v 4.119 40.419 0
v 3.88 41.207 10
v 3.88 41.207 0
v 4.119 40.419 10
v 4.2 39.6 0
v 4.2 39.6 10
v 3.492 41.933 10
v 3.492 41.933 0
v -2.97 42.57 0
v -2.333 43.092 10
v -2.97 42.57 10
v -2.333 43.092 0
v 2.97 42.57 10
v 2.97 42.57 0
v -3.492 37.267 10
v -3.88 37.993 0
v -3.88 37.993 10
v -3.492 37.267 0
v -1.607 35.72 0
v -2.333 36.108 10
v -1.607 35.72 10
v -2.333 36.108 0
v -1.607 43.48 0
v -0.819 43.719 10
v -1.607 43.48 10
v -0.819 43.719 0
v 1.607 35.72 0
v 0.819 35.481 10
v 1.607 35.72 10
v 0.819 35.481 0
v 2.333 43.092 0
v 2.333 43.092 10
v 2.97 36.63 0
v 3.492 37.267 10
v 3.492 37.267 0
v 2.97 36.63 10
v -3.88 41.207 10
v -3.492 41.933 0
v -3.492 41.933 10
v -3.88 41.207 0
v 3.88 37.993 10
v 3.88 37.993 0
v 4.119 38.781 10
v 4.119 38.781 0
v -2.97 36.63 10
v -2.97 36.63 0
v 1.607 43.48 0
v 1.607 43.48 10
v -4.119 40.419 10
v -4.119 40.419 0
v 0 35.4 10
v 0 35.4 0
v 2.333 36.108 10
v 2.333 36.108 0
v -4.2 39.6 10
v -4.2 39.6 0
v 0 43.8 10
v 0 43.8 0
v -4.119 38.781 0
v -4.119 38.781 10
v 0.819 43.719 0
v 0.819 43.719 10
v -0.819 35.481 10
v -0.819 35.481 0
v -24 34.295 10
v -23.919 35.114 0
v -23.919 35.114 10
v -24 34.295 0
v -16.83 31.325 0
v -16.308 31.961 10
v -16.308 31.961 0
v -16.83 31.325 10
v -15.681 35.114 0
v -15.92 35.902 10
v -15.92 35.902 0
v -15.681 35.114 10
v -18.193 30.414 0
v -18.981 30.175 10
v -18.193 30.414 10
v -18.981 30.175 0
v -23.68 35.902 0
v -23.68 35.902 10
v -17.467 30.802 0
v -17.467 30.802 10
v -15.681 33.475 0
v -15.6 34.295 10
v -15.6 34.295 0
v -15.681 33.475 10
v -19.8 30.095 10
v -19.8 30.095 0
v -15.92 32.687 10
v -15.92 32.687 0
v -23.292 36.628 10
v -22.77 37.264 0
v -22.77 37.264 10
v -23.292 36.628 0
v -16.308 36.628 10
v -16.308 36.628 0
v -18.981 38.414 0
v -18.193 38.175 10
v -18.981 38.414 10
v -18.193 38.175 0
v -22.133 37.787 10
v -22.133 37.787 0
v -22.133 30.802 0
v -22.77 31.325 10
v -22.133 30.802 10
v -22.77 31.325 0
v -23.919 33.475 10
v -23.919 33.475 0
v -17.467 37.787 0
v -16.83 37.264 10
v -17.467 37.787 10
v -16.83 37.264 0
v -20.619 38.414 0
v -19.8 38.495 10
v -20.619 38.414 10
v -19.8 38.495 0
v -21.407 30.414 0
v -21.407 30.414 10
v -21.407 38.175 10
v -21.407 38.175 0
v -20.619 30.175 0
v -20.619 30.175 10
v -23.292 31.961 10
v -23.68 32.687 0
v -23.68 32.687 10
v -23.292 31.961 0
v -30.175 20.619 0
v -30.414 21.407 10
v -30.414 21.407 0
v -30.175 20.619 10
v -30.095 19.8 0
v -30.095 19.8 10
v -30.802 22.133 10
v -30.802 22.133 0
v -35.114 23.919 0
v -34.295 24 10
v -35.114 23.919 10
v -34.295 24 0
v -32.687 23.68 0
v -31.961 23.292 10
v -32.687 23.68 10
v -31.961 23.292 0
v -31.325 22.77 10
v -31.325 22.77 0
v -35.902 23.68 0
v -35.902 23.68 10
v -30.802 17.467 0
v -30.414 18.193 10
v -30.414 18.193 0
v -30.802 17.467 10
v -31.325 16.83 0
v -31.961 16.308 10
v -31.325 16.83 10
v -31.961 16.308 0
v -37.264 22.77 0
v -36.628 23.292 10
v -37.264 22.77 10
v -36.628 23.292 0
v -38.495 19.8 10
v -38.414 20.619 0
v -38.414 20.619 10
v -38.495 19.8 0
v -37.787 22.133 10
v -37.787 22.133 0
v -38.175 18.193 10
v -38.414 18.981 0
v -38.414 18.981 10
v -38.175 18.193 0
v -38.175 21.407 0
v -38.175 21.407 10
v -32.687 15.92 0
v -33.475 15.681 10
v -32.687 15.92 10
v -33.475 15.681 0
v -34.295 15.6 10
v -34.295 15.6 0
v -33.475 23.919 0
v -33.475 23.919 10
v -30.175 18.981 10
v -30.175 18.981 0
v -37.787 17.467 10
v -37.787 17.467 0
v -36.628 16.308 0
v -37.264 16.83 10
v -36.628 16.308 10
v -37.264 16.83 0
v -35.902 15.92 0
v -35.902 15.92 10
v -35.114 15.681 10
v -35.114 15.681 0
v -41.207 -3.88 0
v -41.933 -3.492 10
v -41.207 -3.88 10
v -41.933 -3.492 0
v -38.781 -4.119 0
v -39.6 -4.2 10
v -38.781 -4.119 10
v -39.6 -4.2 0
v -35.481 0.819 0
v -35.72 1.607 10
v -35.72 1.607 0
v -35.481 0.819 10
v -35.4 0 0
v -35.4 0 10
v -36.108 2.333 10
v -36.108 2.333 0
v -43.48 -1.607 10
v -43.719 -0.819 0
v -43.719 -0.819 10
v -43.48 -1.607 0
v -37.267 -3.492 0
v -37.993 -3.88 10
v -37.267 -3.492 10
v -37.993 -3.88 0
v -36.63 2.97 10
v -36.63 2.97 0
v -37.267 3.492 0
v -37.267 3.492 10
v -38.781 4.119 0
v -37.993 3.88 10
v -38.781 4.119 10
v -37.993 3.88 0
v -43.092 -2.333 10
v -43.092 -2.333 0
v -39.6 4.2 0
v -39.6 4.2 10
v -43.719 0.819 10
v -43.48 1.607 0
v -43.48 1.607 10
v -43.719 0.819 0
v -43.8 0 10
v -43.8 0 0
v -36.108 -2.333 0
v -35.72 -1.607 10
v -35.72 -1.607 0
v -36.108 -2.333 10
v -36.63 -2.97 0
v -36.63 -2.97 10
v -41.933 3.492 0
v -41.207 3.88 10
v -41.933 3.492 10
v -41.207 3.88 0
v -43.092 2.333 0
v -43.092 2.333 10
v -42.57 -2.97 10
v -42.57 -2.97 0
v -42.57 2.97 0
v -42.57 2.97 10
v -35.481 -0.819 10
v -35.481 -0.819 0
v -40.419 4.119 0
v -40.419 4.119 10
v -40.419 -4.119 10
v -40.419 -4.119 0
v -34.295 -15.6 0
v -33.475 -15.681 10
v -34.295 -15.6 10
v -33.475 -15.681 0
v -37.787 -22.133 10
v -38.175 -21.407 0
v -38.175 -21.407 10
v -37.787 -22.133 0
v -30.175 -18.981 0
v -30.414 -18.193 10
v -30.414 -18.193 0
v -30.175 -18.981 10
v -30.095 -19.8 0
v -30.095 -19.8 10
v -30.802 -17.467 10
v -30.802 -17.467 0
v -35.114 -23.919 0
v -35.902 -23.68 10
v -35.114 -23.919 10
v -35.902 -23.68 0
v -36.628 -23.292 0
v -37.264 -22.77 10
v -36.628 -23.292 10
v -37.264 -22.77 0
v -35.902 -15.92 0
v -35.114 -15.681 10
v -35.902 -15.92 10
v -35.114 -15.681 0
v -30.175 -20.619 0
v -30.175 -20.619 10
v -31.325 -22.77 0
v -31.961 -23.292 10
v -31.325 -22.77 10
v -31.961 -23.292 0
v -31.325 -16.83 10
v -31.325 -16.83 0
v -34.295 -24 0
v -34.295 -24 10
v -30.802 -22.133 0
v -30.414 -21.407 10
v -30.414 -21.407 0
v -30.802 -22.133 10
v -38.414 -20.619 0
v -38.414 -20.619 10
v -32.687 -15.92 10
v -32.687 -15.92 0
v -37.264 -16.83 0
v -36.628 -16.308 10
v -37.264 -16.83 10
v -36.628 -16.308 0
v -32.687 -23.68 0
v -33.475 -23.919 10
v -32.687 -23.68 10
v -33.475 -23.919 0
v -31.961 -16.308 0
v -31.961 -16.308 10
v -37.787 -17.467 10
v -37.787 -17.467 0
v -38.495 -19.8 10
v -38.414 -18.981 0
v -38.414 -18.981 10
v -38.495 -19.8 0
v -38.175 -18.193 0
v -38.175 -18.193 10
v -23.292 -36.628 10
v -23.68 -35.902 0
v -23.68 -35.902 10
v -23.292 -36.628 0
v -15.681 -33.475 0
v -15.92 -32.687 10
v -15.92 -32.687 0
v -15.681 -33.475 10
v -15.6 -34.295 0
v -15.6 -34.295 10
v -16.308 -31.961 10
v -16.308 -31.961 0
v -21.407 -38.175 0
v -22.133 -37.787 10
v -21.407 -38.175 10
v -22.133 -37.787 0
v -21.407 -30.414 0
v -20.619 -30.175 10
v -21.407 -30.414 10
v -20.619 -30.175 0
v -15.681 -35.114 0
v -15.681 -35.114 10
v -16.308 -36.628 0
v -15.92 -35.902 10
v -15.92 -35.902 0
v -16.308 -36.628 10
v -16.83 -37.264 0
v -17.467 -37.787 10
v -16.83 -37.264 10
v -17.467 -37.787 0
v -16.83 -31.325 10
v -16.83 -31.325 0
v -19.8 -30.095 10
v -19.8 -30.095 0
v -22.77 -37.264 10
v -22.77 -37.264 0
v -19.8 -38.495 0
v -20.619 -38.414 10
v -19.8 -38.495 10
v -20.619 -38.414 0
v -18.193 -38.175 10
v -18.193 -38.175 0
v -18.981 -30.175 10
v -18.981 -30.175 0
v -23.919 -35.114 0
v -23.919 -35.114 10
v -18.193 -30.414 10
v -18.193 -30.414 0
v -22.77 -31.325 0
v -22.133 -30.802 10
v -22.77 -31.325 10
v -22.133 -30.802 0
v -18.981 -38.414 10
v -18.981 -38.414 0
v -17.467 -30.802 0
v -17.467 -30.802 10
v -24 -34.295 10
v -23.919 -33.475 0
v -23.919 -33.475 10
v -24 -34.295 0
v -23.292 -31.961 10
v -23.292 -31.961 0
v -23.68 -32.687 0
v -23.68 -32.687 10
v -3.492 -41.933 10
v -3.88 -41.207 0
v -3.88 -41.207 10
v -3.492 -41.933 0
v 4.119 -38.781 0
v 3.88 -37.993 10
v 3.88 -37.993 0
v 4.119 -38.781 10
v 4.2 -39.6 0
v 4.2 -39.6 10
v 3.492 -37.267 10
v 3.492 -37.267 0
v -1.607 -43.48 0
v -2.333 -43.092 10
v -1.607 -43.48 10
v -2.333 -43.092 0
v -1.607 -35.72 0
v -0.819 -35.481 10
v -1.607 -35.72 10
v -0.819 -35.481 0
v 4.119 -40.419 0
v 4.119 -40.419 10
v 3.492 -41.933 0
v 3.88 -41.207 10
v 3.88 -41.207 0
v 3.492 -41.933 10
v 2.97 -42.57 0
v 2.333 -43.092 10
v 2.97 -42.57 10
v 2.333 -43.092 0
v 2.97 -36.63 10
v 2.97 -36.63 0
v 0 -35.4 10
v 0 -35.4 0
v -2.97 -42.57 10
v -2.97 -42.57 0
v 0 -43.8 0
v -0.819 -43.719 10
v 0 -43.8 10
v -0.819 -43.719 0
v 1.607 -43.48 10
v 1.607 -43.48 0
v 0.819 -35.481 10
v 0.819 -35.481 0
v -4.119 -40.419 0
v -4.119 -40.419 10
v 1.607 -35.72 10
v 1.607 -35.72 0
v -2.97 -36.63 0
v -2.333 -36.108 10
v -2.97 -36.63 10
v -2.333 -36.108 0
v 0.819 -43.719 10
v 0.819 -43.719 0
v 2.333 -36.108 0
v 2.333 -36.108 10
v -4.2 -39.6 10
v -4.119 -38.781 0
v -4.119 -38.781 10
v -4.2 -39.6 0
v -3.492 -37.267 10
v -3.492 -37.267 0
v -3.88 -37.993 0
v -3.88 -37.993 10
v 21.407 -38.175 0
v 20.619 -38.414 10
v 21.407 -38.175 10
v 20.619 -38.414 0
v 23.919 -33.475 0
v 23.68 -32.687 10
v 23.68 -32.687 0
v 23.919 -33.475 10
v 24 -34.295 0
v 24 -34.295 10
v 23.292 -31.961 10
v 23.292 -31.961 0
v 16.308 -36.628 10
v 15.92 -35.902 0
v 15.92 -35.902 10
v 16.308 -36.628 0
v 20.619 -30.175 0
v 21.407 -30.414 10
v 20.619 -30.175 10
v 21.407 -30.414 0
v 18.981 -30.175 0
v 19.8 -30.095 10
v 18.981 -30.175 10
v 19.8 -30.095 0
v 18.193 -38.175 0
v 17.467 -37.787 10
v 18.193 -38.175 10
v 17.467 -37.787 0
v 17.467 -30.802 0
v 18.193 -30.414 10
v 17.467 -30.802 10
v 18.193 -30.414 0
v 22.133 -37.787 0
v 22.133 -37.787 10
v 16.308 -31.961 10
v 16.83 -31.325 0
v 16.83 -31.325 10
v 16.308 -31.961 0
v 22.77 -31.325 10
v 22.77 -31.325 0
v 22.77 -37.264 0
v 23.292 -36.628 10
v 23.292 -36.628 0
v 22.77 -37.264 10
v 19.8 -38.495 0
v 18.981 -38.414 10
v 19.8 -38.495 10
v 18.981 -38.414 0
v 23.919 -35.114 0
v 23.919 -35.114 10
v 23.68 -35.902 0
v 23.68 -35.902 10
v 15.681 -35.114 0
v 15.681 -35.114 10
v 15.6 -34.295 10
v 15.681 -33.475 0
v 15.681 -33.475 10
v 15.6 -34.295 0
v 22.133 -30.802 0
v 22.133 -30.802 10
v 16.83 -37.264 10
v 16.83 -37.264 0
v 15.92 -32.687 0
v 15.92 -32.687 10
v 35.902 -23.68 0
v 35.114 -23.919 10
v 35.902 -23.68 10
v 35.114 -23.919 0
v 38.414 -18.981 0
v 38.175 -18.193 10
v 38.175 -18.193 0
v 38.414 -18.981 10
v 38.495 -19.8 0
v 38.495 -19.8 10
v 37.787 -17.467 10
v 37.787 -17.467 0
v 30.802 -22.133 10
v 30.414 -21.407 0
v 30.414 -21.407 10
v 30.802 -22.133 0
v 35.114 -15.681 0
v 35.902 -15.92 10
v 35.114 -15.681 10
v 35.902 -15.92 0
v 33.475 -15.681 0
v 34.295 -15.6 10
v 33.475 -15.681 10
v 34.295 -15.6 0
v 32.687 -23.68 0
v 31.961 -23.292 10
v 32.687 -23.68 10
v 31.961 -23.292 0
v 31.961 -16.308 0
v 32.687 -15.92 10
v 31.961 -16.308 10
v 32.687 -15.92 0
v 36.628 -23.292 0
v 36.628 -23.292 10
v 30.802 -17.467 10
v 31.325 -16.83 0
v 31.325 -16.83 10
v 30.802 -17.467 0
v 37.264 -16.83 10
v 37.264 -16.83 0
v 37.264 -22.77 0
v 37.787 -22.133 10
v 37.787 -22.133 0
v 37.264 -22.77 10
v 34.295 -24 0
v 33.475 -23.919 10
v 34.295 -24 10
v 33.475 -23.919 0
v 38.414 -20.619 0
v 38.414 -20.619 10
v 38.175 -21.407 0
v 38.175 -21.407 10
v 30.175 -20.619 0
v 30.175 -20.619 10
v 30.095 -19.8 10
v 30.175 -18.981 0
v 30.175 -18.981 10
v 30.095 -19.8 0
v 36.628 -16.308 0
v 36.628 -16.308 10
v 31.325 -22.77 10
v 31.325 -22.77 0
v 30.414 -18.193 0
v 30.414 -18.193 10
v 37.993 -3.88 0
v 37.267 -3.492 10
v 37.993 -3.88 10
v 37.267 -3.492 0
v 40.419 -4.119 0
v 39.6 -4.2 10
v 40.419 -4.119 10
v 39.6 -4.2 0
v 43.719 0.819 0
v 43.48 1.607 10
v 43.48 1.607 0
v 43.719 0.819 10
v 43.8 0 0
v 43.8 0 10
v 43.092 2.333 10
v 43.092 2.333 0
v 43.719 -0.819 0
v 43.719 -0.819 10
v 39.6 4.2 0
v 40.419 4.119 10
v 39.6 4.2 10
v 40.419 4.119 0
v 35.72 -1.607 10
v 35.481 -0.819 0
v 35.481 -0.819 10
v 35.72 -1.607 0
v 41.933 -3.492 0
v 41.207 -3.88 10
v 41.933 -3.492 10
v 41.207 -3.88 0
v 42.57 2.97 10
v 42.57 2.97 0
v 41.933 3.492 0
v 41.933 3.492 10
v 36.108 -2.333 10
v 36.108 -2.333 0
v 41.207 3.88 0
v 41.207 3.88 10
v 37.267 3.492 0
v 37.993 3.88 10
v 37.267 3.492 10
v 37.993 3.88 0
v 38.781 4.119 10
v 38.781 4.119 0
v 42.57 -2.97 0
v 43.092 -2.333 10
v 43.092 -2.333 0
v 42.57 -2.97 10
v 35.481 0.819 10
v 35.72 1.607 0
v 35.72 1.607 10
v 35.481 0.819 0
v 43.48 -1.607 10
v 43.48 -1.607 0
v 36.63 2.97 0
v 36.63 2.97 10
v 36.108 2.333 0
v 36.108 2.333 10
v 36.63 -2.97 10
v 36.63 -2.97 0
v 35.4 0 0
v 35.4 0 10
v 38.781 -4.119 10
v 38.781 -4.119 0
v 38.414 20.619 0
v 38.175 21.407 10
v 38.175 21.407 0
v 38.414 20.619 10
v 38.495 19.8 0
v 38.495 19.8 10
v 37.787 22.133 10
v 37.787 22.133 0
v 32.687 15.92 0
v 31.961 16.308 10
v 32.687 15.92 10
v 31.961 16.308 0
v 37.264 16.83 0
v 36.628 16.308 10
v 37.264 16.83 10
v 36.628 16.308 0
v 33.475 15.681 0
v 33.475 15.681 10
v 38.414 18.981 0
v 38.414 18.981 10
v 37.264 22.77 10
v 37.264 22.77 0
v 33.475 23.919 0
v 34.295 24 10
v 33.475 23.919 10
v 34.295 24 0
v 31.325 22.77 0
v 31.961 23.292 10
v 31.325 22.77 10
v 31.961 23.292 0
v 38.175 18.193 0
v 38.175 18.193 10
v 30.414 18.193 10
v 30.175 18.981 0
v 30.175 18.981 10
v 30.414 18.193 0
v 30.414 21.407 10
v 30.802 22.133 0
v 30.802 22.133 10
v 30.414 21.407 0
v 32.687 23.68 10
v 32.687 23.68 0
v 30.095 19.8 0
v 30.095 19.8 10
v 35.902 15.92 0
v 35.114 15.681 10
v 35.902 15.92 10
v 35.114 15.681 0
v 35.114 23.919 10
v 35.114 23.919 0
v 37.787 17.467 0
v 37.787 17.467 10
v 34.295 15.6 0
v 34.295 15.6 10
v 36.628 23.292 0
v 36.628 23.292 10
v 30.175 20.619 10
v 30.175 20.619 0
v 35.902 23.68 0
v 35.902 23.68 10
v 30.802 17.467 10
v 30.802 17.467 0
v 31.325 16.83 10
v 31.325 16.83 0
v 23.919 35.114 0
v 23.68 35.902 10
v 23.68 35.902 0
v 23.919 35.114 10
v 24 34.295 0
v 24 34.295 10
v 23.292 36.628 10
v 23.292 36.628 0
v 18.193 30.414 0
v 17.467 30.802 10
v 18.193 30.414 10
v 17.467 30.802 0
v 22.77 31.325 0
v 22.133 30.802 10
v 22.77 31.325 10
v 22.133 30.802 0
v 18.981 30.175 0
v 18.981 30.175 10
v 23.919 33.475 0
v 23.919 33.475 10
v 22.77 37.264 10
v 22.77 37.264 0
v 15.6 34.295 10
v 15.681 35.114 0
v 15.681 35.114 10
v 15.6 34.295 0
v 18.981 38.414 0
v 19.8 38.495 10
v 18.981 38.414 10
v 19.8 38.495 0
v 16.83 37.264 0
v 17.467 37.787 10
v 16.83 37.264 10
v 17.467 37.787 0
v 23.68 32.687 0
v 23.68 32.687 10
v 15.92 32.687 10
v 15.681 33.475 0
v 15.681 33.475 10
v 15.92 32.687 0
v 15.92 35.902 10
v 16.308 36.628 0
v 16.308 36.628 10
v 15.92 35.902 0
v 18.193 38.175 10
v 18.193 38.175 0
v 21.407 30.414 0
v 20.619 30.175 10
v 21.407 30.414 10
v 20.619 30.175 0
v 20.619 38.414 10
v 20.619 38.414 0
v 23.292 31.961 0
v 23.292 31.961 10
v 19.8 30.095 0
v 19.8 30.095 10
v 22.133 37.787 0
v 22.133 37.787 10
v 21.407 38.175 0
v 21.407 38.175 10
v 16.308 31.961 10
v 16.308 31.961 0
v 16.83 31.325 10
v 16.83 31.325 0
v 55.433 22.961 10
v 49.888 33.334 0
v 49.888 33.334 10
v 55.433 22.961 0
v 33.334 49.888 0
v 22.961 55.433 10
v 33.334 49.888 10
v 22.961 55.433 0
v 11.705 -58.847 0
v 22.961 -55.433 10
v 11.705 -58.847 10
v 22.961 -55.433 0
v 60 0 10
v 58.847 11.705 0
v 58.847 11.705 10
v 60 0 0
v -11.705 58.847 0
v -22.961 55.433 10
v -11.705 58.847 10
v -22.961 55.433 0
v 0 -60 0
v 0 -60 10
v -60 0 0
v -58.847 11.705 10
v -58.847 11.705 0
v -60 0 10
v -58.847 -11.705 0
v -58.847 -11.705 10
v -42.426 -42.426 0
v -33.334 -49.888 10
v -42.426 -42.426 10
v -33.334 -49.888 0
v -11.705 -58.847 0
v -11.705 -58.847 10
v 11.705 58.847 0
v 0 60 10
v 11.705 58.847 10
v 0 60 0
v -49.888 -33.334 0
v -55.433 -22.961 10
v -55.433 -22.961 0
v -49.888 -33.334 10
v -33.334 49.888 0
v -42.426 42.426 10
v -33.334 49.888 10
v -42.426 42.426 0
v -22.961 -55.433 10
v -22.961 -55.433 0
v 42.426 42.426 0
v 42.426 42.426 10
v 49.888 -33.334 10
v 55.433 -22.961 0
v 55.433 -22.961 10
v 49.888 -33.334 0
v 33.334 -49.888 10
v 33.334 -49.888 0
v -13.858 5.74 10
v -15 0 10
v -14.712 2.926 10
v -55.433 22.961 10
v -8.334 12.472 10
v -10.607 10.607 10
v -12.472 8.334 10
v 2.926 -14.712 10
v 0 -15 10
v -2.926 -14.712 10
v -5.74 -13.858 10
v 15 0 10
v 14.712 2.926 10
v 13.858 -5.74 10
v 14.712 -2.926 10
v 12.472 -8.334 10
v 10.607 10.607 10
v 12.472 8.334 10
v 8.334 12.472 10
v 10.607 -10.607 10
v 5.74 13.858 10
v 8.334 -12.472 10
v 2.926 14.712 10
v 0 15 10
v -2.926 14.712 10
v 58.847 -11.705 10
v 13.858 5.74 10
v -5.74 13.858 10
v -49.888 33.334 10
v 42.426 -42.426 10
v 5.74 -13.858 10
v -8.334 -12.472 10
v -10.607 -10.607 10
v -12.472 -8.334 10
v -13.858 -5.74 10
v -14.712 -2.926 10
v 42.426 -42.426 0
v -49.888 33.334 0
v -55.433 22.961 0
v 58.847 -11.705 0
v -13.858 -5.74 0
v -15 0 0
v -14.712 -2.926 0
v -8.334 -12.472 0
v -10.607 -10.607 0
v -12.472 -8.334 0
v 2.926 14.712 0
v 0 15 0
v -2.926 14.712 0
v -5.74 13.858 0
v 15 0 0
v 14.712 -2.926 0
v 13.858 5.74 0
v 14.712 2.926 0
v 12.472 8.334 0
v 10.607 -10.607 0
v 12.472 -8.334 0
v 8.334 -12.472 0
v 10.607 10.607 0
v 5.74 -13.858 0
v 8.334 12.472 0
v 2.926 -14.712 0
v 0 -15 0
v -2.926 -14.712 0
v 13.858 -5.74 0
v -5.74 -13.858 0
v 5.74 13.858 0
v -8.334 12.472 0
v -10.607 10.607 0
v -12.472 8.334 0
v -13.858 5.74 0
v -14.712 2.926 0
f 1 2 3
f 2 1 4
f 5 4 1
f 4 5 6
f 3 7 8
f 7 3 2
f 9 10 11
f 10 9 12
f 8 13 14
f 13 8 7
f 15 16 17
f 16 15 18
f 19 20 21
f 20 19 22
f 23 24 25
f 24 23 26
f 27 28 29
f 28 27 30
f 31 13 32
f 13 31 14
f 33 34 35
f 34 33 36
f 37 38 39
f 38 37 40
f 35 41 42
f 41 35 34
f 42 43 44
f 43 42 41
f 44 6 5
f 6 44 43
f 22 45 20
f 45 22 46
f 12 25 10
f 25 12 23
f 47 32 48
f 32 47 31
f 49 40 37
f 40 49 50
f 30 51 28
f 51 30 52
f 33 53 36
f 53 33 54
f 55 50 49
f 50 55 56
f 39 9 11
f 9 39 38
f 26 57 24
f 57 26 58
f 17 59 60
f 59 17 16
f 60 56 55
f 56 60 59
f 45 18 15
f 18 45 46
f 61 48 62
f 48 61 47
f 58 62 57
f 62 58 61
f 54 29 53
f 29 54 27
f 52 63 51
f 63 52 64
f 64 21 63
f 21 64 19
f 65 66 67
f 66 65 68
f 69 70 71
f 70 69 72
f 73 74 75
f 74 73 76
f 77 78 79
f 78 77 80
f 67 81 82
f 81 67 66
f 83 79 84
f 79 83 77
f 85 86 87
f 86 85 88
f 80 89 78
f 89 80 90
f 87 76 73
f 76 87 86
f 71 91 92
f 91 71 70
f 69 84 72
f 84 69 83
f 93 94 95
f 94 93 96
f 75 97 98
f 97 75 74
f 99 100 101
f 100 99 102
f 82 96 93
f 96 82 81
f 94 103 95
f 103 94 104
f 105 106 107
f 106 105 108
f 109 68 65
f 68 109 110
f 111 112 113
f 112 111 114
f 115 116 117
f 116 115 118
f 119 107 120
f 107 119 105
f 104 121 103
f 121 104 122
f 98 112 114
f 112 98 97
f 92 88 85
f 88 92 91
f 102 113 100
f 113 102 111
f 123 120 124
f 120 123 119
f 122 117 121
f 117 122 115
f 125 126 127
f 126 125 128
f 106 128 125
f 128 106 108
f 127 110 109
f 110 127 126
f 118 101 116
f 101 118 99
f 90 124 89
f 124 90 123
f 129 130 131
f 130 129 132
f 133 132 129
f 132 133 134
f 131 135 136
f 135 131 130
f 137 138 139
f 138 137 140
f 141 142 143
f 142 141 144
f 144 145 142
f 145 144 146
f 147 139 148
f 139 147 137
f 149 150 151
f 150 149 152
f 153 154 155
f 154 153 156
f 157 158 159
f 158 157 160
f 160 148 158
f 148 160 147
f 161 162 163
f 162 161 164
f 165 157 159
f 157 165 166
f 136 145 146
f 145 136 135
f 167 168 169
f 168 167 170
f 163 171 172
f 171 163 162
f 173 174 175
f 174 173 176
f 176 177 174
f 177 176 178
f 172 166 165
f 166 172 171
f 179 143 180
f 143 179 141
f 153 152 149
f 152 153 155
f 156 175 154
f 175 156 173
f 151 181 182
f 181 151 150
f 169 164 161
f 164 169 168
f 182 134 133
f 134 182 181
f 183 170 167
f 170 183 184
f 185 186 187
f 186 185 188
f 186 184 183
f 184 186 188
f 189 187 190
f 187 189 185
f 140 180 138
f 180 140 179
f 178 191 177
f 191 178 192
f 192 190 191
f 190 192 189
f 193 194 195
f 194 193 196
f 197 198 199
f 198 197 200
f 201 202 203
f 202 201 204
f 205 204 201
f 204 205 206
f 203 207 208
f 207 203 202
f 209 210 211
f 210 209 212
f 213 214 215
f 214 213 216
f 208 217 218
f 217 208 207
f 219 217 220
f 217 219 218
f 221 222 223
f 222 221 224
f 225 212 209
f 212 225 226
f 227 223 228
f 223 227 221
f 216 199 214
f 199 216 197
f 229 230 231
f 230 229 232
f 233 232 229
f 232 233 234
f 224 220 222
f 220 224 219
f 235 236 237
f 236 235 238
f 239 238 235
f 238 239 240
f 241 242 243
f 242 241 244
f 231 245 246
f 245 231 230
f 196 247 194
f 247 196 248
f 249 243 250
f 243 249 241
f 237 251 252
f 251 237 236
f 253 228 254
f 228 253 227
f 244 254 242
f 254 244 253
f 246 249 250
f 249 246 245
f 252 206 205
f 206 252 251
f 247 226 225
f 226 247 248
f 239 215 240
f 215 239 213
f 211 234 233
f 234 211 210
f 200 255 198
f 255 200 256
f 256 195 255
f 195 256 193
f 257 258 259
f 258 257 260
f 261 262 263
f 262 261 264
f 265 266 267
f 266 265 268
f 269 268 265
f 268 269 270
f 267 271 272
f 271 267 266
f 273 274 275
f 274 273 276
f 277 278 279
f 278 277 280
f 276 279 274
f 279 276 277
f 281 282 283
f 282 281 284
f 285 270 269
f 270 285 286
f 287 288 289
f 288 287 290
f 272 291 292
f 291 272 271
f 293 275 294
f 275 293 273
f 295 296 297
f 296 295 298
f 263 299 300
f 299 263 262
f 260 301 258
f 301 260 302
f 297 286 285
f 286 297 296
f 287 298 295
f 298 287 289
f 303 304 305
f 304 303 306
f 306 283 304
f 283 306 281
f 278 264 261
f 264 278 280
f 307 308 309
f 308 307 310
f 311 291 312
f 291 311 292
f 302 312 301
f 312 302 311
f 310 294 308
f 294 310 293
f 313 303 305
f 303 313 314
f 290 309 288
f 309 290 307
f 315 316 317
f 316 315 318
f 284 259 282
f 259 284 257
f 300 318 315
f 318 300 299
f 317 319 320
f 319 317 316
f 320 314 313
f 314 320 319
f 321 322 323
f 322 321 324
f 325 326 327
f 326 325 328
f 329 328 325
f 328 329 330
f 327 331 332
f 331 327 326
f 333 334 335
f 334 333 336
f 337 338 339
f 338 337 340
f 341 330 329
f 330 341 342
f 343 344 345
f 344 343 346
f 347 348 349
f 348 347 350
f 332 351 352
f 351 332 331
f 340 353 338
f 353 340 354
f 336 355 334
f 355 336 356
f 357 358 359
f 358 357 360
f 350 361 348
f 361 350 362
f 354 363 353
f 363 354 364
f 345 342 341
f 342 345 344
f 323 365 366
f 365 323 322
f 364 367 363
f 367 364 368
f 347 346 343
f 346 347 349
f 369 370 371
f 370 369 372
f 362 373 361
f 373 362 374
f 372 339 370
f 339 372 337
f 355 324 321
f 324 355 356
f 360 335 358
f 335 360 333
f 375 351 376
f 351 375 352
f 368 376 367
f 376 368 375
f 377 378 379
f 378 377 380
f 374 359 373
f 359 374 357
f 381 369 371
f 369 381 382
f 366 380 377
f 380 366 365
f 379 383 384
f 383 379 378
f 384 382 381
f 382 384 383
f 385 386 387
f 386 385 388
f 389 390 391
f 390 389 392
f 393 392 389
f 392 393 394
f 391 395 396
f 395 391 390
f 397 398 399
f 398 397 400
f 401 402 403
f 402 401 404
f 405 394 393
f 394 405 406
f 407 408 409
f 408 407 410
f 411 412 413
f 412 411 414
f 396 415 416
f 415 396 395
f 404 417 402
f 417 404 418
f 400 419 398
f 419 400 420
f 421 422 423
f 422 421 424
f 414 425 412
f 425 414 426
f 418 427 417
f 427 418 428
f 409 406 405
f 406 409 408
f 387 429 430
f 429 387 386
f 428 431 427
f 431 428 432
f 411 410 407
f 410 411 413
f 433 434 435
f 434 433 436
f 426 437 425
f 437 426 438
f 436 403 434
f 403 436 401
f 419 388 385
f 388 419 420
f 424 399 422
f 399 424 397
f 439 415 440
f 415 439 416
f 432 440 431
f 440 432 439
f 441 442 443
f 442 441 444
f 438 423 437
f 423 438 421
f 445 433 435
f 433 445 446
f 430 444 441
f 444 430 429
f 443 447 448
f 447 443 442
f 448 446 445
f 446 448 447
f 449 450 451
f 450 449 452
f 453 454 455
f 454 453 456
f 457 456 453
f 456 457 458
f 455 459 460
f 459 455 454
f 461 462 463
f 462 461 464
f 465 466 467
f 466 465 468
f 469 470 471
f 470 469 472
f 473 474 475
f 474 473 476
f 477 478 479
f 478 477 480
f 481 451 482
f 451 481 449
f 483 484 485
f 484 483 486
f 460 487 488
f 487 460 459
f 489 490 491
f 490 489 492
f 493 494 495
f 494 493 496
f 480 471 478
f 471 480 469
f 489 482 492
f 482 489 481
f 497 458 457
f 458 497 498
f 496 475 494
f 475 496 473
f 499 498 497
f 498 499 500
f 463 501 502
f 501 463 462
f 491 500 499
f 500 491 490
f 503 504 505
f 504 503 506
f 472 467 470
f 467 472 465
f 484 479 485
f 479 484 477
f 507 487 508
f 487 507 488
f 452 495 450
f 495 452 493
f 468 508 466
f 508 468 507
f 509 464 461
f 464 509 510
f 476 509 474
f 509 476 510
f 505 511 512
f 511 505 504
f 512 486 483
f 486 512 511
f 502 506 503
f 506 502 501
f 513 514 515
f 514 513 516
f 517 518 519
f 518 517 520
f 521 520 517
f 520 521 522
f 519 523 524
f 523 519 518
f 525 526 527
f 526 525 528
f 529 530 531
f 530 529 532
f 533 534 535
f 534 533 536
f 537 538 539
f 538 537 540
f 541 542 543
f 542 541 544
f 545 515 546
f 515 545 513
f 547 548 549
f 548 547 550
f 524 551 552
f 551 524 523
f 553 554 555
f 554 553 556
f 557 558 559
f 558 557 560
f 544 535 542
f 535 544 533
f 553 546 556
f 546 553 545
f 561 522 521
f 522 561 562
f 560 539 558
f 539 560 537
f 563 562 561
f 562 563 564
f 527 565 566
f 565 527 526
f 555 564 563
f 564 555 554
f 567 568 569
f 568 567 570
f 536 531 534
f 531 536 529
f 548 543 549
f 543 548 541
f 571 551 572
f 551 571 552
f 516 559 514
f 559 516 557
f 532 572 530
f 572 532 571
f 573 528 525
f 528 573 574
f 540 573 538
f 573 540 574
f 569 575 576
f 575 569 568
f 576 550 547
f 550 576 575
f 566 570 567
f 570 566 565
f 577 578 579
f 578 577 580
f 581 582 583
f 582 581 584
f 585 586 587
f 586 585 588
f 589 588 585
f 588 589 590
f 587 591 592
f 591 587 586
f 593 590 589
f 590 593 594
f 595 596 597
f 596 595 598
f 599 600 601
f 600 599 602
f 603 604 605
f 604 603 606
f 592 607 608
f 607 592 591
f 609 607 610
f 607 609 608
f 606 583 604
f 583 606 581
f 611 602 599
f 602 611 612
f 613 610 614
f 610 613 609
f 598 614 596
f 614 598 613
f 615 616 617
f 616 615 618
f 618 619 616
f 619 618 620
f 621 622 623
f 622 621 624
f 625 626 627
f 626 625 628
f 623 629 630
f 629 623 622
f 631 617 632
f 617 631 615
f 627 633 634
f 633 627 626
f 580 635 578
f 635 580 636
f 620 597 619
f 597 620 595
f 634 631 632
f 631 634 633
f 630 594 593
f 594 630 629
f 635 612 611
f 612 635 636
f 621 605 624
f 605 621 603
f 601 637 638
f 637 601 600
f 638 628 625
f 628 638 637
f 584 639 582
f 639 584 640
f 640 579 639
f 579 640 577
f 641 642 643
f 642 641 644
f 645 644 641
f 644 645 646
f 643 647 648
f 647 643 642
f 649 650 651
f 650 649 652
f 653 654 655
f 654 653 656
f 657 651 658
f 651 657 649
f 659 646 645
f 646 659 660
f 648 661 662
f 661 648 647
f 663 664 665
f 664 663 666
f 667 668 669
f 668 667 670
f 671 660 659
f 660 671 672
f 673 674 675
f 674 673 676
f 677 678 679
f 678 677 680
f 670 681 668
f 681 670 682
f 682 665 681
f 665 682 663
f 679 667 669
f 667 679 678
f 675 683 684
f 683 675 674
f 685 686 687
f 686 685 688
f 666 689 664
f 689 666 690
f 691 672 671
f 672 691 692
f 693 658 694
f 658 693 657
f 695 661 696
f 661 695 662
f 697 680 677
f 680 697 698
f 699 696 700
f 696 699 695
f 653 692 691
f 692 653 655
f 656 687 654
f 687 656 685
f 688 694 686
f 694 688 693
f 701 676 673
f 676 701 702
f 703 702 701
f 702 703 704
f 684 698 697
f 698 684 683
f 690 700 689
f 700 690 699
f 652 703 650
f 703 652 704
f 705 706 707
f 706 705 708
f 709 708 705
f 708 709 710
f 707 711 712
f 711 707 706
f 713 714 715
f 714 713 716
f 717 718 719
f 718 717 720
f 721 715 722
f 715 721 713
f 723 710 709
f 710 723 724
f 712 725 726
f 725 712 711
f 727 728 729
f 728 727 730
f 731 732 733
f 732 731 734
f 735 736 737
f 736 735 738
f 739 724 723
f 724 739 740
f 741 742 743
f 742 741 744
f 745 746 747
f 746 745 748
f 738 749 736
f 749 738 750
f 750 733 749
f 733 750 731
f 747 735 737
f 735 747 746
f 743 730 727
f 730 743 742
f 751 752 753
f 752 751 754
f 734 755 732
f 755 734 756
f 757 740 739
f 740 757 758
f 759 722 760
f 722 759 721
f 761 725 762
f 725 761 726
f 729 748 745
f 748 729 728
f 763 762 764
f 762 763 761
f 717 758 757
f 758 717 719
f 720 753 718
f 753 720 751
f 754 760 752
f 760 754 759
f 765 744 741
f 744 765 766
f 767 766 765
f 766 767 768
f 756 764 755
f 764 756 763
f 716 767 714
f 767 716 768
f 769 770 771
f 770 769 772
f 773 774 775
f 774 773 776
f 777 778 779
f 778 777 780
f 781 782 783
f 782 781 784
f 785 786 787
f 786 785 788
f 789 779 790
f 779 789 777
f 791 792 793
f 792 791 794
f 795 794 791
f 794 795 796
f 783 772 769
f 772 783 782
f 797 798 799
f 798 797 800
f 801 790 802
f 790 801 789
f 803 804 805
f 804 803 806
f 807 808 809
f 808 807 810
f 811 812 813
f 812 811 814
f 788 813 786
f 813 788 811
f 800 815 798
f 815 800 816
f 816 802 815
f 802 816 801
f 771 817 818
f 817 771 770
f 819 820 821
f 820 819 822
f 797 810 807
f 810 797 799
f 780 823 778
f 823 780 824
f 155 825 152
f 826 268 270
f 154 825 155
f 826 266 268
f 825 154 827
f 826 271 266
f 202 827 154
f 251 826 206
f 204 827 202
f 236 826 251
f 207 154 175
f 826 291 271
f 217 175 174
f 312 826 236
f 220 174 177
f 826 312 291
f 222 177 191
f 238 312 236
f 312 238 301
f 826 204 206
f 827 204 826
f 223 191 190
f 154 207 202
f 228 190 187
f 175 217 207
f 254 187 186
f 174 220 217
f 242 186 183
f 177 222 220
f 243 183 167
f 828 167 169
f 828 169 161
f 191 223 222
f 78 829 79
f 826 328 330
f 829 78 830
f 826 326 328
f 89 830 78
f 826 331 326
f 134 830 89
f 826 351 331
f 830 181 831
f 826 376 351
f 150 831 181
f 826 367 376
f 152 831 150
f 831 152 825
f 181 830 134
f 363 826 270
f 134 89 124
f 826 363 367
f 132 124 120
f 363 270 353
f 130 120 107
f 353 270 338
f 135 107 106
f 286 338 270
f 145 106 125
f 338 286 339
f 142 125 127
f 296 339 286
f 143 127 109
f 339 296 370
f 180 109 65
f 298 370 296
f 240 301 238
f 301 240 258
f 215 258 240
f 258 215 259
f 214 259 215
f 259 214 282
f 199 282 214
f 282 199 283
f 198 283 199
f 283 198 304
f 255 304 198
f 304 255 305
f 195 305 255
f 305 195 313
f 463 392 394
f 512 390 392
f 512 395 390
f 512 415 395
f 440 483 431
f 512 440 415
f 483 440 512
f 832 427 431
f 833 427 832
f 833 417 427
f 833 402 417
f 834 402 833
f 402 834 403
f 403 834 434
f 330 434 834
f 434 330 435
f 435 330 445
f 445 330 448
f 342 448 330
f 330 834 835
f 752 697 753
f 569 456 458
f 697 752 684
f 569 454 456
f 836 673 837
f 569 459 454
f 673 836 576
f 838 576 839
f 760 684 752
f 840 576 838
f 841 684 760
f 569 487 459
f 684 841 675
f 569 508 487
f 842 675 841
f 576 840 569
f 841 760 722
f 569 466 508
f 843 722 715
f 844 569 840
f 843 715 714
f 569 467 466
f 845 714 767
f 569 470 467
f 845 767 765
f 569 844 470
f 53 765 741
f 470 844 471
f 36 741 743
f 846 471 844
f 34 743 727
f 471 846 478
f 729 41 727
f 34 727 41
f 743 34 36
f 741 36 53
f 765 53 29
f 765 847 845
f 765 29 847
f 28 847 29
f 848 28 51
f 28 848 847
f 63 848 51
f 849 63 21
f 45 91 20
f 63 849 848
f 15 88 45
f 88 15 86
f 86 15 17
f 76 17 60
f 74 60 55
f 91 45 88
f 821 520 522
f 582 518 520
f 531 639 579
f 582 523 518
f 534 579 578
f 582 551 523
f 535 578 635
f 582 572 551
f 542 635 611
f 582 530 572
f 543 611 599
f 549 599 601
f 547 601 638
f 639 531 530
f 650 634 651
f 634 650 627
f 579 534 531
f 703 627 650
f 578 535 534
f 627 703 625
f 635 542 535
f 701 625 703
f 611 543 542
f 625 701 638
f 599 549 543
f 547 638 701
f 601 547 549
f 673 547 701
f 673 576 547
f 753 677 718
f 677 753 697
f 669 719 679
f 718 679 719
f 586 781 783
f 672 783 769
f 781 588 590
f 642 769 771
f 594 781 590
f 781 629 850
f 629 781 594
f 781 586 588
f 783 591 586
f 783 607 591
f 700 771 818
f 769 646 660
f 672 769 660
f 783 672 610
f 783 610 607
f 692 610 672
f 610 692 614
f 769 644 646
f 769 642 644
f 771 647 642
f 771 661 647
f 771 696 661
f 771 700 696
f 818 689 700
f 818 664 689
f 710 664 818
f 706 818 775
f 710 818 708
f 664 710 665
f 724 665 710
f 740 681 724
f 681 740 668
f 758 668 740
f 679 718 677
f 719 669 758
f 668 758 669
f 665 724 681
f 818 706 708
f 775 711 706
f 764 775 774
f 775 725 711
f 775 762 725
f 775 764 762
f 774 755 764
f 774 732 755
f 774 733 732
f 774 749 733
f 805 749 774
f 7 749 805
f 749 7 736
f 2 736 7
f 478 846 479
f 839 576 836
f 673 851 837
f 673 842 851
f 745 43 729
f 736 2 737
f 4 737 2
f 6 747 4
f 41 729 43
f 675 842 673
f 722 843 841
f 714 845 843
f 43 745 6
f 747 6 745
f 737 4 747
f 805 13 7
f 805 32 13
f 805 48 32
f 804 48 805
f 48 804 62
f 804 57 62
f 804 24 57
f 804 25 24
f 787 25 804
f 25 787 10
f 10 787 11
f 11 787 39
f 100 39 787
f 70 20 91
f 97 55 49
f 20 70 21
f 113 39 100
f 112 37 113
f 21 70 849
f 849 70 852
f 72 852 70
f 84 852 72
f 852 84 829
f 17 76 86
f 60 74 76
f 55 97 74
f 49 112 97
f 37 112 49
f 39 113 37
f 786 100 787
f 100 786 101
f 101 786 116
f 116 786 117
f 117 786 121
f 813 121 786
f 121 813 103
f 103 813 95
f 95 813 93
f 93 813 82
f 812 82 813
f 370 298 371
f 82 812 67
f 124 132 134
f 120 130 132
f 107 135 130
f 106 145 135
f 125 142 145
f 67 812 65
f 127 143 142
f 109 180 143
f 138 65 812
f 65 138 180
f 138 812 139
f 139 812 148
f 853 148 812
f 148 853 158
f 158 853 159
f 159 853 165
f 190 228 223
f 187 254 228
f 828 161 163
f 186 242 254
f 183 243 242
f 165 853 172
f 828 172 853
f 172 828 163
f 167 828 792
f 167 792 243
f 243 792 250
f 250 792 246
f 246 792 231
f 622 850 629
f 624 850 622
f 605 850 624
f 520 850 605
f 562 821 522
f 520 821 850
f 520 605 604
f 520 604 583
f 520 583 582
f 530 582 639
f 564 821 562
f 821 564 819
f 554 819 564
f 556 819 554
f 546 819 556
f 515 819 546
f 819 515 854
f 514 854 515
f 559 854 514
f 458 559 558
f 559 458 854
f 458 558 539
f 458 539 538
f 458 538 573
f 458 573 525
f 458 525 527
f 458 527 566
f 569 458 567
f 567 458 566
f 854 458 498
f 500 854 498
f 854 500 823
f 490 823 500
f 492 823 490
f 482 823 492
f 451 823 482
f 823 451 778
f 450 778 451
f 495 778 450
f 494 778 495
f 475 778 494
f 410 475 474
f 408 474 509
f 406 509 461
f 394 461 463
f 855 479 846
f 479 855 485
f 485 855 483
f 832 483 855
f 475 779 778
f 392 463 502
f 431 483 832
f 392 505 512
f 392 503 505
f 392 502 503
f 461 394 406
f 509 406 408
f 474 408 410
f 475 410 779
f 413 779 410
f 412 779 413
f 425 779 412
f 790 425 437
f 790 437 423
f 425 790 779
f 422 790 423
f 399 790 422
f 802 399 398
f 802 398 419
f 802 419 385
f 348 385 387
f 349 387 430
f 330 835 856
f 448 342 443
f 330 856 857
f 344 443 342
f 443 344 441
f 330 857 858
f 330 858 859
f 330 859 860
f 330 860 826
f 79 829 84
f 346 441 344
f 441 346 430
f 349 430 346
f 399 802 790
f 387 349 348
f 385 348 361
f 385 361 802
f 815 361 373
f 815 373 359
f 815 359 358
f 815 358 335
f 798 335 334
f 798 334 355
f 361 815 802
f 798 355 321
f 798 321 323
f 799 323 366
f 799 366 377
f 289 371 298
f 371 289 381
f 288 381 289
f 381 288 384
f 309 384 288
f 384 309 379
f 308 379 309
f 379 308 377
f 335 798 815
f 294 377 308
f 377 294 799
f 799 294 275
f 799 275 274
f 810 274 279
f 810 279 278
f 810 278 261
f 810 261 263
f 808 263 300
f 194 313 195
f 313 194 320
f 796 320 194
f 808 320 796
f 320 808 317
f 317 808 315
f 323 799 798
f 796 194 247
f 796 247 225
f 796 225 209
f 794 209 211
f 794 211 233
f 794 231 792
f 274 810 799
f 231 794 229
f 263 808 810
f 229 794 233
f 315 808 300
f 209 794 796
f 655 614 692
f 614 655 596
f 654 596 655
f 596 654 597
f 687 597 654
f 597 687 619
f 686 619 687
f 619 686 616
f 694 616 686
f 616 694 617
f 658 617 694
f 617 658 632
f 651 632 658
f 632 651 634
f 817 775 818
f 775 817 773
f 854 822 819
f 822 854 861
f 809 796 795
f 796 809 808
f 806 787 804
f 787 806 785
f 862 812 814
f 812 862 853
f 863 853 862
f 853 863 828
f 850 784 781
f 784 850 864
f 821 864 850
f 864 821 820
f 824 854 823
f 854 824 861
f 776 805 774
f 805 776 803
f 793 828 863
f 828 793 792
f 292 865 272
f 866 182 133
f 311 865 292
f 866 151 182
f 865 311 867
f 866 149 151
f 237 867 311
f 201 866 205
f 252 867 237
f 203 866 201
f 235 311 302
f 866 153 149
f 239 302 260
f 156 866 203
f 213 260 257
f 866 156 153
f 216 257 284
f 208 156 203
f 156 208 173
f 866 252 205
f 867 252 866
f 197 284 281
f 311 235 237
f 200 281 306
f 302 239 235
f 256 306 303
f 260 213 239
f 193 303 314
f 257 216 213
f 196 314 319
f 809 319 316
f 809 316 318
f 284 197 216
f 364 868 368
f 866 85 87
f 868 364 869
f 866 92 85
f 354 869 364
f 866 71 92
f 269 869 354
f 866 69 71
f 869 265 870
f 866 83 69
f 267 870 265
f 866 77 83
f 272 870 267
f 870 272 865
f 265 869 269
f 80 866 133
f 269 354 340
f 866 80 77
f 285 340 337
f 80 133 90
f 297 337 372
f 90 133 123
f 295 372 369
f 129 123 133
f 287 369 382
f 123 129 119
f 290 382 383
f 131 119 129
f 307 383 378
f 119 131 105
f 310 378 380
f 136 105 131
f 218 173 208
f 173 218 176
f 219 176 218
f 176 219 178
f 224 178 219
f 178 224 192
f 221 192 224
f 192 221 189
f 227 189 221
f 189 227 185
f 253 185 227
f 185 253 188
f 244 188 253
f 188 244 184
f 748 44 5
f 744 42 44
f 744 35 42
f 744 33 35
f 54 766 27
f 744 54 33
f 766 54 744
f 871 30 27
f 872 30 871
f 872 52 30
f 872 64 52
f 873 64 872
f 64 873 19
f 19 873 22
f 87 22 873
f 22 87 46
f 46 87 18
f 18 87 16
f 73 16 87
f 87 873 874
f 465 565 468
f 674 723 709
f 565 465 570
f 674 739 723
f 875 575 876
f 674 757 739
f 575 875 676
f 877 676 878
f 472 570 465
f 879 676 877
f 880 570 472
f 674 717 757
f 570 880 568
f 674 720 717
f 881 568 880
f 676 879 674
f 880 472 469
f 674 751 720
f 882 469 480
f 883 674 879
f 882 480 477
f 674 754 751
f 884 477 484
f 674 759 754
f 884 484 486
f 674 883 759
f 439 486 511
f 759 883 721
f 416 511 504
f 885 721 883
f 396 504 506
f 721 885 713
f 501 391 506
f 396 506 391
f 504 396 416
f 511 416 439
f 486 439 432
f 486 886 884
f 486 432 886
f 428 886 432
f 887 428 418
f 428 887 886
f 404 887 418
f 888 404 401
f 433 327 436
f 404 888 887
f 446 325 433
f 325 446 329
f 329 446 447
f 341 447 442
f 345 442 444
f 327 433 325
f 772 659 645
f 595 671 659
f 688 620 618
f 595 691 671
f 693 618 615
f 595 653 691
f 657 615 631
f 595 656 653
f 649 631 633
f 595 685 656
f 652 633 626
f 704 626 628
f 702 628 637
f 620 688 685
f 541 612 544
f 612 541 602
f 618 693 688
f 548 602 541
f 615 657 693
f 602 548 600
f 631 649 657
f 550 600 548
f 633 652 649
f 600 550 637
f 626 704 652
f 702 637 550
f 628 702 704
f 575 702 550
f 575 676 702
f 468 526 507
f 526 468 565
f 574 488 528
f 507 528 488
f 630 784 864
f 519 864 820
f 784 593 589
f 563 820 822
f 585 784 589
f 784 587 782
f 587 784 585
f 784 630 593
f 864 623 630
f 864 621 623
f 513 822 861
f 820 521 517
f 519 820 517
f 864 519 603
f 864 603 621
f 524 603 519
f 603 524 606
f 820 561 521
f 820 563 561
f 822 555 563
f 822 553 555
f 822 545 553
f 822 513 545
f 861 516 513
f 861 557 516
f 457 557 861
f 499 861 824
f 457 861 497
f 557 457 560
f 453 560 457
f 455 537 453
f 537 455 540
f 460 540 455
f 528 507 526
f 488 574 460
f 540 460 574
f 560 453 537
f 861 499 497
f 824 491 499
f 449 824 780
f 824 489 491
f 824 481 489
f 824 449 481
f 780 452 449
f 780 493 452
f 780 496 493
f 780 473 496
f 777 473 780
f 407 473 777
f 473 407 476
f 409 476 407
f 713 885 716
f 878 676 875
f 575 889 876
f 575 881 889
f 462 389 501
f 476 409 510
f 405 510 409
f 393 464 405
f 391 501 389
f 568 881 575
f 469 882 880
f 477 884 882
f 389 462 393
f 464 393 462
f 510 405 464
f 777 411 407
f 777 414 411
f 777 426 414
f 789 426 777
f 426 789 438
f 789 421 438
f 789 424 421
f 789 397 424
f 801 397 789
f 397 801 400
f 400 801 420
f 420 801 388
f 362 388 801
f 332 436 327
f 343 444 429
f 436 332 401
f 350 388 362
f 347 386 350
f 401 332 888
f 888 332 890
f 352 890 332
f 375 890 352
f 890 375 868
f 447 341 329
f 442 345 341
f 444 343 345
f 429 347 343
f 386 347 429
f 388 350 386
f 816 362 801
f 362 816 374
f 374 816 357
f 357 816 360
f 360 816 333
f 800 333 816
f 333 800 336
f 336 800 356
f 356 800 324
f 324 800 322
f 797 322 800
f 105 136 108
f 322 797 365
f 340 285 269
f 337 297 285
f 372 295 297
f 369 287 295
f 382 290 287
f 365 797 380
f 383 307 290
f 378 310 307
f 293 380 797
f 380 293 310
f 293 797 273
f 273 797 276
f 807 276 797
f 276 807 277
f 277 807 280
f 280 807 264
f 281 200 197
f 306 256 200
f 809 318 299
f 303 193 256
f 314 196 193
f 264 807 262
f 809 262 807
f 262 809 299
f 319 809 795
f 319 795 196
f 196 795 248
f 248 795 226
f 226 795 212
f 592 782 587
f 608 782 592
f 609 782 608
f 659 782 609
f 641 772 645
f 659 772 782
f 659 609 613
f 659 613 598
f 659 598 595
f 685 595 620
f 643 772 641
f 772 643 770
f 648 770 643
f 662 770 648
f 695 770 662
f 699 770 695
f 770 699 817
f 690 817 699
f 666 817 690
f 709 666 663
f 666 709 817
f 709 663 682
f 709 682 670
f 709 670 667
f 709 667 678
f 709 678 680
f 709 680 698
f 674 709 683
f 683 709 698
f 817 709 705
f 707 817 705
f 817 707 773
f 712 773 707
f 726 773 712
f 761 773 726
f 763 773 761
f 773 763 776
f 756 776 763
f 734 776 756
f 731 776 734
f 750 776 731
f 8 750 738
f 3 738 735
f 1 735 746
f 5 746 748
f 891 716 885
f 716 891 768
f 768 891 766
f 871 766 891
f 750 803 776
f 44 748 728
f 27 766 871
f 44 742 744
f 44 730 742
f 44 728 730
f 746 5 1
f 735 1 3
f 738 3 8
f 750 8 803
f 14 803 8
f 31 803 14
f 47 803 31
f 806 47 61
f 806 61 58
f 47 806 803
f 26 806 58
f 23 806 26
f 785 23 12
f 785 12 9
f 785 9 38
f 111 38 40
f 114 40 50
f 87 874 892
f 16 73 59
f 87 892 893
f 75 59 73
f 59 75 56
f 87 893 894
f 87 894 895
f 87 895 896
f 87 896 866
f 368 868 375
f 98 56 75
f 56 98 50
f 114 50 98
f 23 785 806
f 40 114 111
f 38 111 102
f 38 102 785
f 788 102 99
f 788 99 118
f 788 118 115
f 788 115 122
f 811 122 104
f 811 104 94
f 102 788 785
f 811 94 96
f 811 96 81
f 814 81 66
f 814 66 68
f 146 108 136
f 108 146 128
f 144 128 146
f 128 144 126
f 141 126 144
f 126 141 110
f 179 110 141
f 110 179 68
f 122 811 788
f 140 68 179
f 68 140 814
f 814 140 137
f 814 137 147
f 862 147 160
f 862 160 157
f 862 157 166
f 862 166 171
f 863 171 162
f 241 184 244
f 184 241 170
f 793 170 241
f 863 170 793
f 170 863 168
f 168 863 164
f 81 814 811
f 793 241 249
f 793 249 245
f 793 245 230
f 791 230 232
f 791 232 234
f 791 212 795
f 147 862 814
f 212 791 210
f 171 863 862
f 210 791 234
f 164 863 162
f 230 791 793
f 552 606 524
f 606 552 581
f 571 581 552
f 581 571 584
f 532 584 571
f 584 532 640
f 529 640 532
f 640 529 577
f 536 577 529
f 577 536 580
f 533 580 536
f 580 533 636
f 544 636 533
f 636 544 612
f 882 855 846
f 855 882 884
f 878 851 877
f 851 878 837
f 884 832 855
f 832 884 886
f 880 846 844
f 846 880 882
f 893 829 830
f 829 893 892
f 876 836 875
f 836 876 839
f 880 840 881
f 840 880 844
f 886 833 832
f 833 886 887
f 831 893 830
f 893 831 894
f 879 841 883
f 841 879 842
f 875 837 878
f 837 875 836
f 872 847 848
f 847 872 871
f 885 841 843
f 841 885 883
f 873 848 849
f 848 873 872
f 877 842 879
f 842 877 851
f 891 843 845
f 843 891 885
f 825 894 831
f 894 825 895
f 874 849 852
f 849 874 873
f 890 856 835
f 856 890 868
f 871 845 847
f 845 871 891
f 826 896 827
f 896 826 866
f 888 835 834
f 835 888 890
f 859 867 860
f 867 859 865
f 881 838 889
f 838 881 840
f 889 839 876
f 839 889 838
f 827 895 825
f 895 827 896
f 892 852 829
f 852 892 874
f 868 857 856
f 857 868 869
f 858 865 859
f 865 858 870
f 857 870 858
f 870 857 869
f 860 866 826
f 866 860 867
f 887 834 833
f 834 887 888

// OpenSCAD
$fn = 32;

// ----------------------------------------------------------------------
// Flange Ø120 x 10
// 12 holes on a Ø79.2 bolt circle, bolted joints
// ----------------------------------------------------------------------

// --- parameters (mm) ---
flange_d = 120;  // outside diameter of the flange
thickness = 10;  // flange thickness
holes = 12;      // number of bolt holes
pcd = 79.2;      // bolt circle diameter
start_deg = 90;  // angle of the first hole, from +X
hole_d = 8.4;    // bolt hole diameter
bore_d = 30;     // central through bore
hub_d = 40;      // hub outside diameter
hub_h = 0;       // hub height above the flange face (0 = no hub)

// --- derived feature positions (mm) ---
height = thickness + hub_h;  // = 10   overall height of the part
pcd_r = pcd / 2;             // = 39.6   bolt circle radius
hole_step = 360 / holes;     // = 30   angular pitch
feature_centers = [
  [pcd_r * cos(start_deg + 0 * hole_step), pcd_r * sin(start_deg + 0 * hole_step)],
  [pcd_r * cos(start_deg + 1 * hole_step), pcd_r * sin(start_deg + 1 * hole_step)],
  [pcd_r * cos(start_deg + 2 * hole_step), pcd_r * sin(start_deg + 2 * hole_step)],
  [pcd_r * cos(start_deg + 3 * hole_step), pcd_r * sin(start_deg + 3 * hole_step)],
  [pcd_r * cos(start_deg + 4 * hole_step), pcd_r * sin(start_deg + 4 * hole_step)],
  [pcd_r * cos(start_deg + 5 * hole_step), pcd_r * sin(start_deg + 5 * hole_step)],
  [pcd_r * cos(start_deg + 6 * hole_step), pcd_r * sin(start_deg + 6 * hole_step)],
  [pcd_r * cos(start_deg + 7 * hole_step), pcd_r * sin(start_deg + 7 * hole_step)],
  [pcd_r * cos(start_deg + 8 * hole_step), pcd_r * sin(start_deg + 8 * hole_step)],
  [pcd_r * cos(start_deg + 9 * hole_step), pcd_r * sin(start_deg + 9 * hole_step)],
  [pcd_r * cos(start_deg + 10 * hole_step), pcd_r * sin(start_deg + 10 * hole_step)],
  [pcd_r * cos(start_deg + 11 * hole_step), pcd_r * sin(start_deg + 11 * hole_step)]
];   // bolt hole centres on the pitch circle

// flange disc, every hole and the bore cut straight through
difference() {
  union() {
    cylinder(d = flange_d, h = thickness);
  }
  translate([0, 0, -1]) cylinder(d = bore_d, h = height + 2);  // bore, through
  for (centre = feature_centers)
    translate([centre[0], centre[1], -1]) cylinder(d = hole_d, h = thickness + 2);
}
